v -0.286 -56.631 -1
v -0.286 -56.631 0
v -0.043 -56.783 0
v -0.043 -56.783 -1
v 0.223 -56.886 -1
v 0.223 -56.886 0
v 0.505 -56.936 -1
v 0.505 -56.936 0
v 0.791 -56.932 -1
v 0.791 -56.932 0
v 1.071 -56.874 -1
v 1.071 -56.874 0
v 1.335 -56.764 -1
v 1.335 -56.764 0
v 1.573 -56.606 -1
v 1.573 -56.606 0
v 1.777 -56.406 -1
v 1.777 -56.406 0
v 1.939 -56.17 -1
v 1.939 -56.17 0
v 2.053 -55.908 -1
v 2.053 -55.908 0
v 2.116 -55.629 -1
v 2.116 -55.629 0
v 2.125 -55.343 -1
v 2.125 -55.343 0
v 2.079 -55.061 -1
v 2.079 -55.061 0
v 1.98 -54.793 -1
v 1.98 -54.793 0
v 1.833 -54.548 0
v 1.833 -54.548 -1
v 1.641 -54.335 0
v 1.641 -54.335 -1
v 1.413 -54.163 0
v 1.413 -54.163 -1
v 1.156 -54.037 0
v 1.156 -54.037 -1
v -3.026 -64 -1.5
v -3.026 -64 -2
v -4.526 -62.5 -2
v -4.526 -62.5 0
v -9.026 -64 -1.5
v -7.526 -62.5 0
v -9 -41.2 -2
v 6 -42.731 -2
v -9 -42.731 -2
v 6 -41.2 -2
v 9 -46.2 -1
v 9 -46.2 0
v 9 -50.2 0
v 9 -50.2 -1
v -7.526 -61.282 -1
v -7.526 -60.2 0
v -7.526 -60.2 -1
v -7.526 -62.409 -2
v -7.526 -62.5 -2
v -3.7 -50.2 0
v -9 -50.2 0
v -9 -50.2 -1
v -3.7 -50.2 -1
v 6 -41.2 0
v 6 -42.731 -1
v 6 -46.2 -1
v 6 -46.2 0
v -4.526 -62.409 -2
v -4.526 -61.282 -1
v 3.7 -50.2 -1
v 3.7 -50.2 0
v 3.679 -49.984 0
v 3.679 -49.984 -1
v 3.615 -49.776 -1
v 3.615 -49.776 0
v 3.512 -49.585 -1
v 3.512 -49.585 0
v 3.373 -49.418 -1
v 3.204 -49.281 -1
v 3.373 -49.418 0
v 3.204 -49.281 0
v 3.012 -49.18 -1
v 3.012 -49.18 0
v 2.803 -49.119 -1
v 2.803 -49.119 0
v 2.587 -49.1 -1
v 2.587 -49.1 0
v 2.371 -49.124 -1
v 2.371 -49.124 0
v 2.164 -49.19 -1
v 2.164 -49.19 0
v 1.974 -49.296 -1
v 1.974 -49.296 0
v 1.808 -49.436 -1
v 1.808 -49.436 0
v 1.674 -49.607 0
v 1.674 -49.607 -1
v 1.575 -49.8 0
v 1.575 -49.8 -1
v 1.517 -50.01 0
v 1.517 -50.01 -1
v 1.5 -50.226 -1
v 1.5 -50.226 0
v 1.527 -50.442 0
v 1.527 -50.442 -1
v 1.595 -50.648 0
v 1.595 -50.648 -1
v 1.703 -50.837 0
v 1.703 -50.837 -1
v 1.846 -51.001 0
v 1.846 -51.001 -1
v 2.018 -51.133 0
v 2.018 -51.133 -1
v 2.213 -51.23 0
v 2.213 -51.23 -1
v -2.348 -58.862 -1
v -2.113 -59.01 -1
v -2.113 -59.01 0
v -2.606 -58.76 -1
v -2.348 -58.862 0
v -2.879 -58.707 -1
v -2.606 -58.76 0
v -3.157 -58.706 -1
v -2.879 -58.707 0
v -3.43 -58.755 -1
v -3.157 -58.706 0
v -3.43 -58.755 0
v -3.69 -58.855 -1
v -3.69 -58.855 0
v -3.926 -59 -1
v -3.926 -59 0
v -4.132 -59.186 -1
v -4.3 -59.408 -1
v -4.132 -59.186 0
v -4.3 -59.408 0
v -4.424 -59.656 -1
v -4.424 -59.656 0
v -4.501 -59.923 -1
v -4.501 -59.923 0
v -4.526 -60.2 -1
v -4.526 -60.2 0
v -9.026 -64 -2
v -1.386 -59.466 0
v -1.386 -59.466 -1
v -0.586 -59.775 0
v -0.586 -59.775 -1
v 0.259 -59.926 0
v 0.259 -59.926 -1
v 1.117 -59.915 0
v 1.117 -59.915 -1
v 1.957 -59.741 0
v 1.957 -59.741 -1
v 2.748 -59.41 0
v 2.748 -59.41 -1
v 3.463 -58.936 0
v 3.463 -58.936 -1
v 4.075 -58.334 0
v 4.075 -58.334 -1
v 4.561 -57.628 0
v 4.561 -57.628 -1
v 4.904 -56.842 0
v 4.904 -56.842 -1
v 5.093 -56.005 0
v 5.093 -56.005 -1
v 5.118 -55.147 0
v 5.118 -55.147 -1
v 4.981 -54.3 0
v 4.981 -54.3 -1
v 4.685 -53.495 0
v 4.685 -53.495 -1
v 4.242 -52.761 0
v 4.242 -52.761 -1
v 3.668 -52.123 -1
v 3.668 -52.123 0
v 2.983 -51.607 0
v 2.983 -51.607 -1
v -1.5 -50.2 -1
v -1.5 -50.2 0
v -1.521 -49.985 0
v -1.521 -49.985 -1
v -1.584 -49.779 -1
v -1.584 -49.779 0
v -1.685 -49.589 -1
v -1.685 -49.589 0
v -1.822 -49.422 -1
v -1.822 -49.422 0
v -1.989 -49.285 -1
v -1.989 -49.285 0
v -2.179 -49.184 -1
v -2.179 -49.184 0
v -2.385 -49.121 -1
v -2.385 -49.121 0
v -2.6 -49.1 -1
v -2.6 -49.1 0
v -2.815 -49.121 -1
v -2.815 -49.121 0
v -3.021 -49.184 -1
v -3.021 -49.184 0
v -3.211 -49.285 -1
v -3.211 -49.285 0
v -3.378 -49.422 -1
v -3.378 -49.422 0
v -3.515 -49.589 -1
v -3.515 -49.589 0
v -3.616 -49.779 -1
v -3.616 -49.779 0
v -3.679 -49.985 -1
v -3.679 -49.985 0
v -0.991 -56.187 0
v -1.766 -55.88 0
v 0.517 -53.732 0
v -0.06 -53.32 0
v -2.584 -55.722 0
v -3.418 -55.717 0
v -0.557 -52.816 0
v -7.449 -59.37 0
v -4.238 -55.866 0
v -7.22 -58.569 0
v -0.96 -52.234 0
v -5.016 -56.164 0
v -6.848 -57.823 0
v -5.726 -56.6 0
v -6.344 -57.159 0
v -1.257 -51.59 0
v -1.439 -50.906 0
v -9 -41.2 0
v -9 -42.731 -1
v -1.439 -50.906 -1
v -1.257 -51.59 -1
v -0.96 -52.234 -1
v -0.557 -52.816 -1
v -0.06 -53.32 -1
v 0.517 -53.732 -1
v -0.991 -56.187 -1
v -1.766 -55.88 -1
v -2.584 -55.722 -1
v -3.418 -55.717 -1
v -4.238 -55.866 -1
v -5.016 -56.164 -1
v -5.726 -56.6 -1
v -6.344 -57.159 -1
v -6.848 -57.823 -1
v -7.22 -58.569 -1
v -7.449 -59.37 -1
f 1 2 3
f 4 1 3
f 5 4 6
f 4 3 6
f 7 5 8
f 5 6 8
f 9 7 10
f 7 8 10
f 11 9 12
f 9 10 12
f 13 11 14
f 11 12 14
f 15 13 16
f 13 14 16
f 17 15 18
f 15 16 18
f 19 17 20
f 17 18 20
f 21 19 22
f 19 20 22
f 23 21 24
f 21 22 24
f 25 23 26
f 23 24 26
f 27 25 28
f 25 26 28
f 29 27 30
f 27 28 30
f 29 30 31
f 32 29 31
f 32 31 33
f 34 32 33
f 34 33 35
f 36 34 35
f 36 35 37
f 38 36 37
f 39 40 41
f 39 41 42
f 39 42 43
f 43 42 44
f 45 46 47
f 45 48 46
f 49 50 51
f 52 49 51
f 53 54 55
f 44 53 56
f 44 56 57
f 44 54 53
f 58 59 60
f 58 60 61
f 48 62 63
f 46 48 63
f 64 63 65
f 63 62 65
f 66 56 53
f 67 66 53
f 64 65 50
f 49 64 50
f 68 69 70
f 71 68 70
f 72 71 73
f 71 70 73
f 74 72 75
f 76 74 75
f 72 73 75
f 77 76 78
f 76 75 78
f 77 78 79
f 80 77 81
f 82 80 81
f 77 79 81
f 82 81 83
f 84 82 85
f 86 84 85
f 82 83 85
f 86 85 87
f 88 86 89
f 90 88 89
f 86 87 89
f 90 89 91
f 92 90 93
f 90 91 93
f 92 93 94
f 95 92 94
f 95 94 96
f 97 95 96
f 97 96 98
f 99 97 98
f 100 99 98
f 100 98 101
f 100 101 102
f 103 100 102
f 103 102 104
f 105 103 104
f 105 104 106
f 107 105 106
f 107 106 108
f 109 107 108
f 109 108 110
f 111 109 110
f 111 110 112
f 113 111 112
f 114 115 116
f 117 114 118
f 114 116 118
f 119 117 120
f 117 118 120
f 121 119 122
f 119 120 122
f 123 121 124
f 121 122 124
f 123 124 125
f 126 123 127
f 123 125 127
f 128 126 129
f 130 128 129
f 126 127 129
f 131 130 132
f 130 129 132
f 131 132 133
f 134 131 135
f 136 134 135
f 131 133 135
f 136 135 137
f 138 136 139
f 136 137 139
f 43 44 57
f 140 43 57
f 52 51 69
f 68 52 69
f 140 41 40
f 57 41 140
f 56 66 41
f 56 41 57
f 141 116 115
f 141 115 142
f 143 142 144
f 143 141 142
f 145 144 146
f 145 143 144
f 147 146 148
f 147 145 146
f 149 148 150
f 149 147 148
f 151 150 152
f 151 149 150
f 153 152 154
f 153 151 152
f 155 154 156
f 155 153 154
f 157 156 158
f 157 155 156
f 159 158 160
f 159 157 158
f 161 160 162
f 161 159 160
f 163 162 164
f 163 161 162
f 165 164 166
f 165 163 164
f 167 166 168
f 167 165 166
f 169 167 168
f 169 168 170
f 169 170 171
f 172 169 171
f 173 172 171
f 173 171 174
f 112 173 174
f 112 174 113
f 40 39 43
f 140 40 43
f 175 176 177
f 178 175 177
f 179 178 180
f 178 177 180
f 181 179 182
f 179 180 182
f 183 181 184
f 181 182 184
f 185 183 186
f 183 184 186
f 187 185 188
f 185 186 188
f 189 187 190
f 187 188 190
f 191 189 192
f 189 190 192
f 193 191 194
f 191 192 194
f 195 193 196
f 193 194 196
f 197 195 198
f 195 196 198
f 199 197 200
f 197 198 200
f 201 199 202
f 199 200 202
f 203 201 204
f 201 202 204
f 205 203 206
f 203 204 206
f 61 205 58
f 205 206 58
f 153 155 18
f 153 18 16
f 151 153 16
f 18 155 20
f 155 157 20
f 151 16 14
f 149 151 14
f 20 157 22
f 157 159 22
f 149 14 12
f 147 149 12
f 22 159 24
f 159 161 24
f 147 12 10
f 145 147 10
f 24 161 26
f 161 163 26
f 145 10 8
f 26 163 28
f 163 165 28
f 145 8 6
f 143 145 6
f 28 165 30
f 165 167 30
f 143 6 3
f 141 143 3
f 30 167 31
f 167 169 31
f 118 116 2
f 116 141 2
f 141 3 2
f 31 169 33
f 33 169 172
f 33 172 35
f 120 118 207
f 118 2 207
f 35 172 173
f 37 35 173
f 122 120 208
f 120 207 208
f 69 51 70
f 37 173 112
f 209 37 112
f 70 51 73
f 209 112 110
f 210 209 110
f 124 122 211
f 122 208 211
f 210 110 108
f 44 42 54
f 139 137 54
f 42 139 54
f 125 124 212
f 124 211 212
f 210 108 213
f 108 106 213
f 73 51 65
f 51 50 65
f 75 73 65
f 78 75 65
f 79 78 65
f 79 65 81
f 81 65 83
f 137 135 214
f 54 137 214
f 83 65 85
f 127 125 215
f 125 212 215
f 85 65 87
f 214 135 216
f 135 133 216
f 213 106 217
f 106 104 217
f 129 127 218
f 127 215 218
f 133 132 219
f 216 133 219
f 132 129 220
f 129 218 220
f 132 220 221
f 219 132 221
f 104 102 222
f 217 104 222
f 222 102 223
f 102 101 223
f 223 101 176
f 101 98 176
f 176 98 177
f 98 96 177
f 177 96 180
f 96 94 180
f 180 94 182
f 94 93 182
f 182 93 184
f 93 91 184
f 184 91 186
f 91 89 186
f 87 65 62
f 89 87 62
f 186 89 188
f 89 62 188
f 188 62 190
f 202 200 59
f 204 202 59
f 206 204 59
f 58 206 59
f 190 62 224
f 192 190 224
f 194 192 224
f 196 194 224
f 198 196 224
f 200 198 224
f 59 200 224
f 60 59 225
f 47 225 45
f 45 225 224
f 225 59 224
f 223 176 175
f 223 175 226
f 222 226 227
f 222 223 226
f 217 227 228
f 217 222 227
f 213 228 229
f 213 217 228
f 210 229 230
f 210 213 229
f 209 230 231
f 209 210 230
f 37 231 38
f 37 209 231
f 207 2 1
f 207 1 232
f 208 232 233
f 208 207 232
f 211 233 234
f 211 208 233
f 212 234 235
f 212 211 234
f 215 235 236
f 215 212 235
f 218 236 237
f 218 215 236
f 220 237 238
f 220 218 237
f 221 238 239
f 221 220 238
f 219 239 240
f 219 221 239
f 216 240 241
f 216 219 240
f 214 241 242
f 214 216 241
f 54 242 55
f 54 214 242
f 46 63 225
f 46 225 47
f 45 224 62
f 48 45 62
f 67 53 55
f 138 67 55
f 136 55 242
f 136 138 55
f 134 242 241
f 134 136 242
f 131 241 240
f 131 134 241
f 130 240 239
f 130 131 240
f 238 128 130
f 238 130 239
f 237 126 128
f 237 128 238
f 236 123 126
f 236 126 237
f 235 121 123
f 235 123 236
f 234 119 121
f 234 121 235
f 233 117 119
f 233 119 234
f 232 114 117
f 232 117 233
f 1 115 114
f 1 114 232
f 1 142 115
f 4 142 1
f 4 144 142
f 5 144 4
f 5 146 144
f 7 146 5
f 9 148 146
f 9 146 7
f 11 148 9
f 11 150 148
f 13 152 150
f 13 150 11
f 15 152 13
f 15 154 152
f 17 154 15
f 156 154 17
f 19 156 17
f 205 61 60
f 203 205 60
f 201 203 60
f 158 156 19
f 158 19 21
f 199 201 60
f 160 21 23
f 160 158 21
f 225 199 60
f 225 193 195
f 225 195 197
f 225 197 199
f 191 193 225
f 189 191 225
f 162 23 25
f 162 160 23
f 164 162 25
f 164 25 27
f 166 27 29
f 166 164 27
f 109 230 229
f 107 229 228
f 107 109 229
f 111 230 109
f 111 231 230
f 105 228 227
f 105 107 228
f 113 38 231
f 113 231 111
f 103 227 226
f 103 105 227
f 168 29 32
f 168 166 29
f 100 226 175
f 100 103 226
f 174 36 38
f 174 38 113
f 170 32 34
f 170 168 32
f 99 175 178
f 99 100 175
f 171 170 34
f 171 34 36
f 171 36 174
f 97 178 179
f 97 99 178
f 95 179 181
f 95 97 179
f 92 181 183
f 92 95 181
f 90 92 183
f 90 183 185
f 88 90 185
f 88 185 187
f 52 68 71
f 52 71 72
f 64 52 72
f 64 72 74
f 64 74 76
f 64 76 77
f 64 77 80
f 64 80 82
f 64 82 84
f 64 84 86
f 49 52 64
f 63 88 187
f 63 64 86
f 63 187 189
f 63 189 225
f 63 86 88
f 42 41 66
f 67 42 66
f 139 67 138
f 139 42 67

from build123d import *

# Parameters (mm, degrees)
SKETCH_W             = 56
SKETCH_H             = 12
PAD_DEPTH            = 64
POCKET_DEPTH         = 8
PAD001_DEPTH         = 4.5
SKETCH005_R          = 2
SKETCH005_W          = 30
SKETCH005_H          = 5
POCKET001_DEPTH      = 10.5
SKETCH007_R          = 4
SKETCH007_W          = 3
SKETCH007_H          = 7
POCKET002_DEPTH      = 3
CHAMFER_SIZE         = 1.5
PAD002_DEPTH         = 2
CHAMFER001_SIZE      = 1.5
POCKET003_DEPTH      = 9.02746
POCKET003_DEPTH_BACK = 9.001


with BuildPart() as body003:
    # Sketch → Pad (new body)
    with BuildSketch(Plane.XZ):
        with Locations((0, -6)):
            Rectangle(SKETCH_W, SKETCH_H)
    extrude(amount=PAD_DEPTH)

    # Sketch002 → Pocket (cut)
    with BuildSketch(Plane.XY):
        Polygon((-24.2, 0), (-24.2, -57.2), (-17.9, -57.2), (-17.9, -39.2), (17.9, -39.2), (17.9, -57.2), (24.2, -57.2), (24.2, 0), align=None)
        with BuildLine():
            Line((-9, -41.2), (-9, -50.2))
            Line((-9, -50.2), (-3.7, -50.2))
            ThreePointArc((-1.5, -50.2), (-2.6, -49.1), (-3.7, -50.2))
            ThreePointArc((-1.5, -50.2), (-0.771185, -52.533477), (1.156153, -54.037357))
            ThreePointArc((-0.285678, -56.630951), (1.938949, -56.170097), (1.156153, -54.037357))
            ThreePointArc((-0.285678, -56.630951), (-5.015993, -56.163695), (-7.52646, -60.2))
            Line((-7.52646, -60.2), (-7.52646, -67.774911))
            Line((-7.52646, -67.774911), (-4.52646, -67.774911))
            Line((-4.52646, -67.774911), (-4.52646, -60.2))
            ThreePointArc((-2.112866, -59.010317), (-3.689638, -58.854565), (-4.52646, -60.2))
            ThreePointArc((-2.112866, -59.010317), (4.561015, -57.627756), (2.212626, -51.229535))
            ThreePointArc((3.7, -50.2), (1.973945, -49.295536), (2.212626, -51.229535))
            Line((9, -50.2), (3.7, -50.2))
            Line((9, -46.2), (9, -50.2))
            Line((6, -46.2), (9, -46.2))
            Line((6, -41.2), (6, -46.2))
            Line((-9, -41.2), (6, -41.2))
        make_face()
    extrude(amount=-POCKET_DEPTH, mode=Mode.SUBTRACT)

    # Sketch006 → Pad001 (join)
    with BuildSketch(Plane.XY):
        Polygon((-25.2, -12), (-22.614214, -12), (-21.2, -13.414214), (-21.2, -58), (-25.2, -58), align=None)
        Polygon((25.2, -12), (22.614214, -12), (21.2, -13.414214), (21.2, -58), (25.2, -58), align=None)
    extrude(amount=-PAD001_DEPTH)

    # Sketch005 → Pocket001 (cut)
    with BuildSketch(Plane.XY):
        with Locations((-12.5, -56)):
            Circle(SKETCH005_R)
        with Locations((12.5, -56)):
            Circle(SKETCH005_R)
        with BuildLine():
            Line((-12.25, -29), (-12.25, -49.5))
            Line((-12.25, -49.5), (-3.75, -49.5))
            Line((-3.75, -49.5), (-3.75, -49))
            Line((-3.75, -49), (-11.25, -49))
            ThreePointArc((-11.75, -48.5), (-11.603553, -48.853553), (-11.25, -49))
            Line((-11.75, -48.5), (-11.75, -29))
            Line((-11.75, -29), (-12.25, -29))
        make_face()
        with BuildLine():
            Line((12.25, -29), (12.25, -49.5))
            Line((12.25, -49.5), (3.75, -49.5))
            Line((3.75, -49.5), (3.75, -49))
            Line((3.75, -49), (11.25, -49))
            ThreePointArc((11.25, -49), (11.603553, -48.853553), (11.75, -48.5))
            Line((11.75, -48.5), (11.75, -29))
            Line((11.75, -29), (12.25, -29))
        make_face()
        with Locations((0, -6.3)):
            Rectangle(SKETCH005_W, SKETCH005_H)
    extrude(amount=-POCKET001_DEPTH, mode=Mode.SUBTRACT)

    # Sketch007 → Pocket002 (cut)
    with BuildSketch(Plane.XY):
        with Locations((-12.5, -56)):
            Circle(SKETCH007_R)
        with Locations((12.5, -56)):
            Circle(SKETCH007_R)
        with Locations((8.5, -41.5)):
            Rectangle(SKETCH007_W, SKETCH007_H)
    extrude(amount=-POCKET002_DEPTH, mode=Mode.SUBTRACT)

    # Chamfer
    chamfer_edges = [body003.edges().sort_by_distance(p)[0] for p in [
        (28, -32, -12),
        (-28, -32, -12),
        (0, 0, -12),
        (0, -64, -12),
        (28, -32, 0),
        (28, 0, -6),
        (28, -64, -6),
        (-28, -32, 0),
        (-28, 0, -6),
        (-28, -64, -6),
        (11.73677, -64, 0),
        (-4.52646, -64, -4),
        (-6.02646, -64, -8),
        (-7.52646, -64, -4),
        (-17.76323, -64, 0),
        (-26.1, 0, 0),
        (26.1, 0, 0),
    ]]
    chamfer(chamfer_edges, length=CHAMFER_SIZE)


with BuildPart() as cablecover:
    # Sketch008 → Pad002 (new body)
    with BuildSketch(Plane.XY):
        Polygon((5.266473, -64), (-9.544278, -64), (-7.665841, -56.897079), (-9, -50.2), (-9, -41.2), (6.447607, -41.2), (6.447607, -45.58699), (9, -45.58699), (9, -50.2), align=None)
    extrude(amount=-PAD002_DEPTH)

    # Chamfer001
    chamfer001_edges = [cablecover.edges().sort_by_distance(p)[0] for p in [
        (-2.138902, -64, 0),
    ]]
    chamfer(chamfer001_edges, length=CHAMFER001_SIZE)

    # Cut: cut Body003
    add(body003.part, mode=Mode.SUBTRACT)

    # Sketch009 → Pocket003 (cut, two sides)
    with BuildSketch(Plane.YZ) as pocket003_sk:
        Polygon((-42.730701, -2), (-62.409084, -2), (-61.282127, -1), (-42.730701, -1), align=None)
    extrude(amount=-POCKET003_DEPTH, mode=Mode.SUBTRACT)
    extrude(pocket003_sk.sketch, amount=POCKET003_DEPTH_BACK, mode=Mode.SUBTRACT)


solid = cablecover.part
